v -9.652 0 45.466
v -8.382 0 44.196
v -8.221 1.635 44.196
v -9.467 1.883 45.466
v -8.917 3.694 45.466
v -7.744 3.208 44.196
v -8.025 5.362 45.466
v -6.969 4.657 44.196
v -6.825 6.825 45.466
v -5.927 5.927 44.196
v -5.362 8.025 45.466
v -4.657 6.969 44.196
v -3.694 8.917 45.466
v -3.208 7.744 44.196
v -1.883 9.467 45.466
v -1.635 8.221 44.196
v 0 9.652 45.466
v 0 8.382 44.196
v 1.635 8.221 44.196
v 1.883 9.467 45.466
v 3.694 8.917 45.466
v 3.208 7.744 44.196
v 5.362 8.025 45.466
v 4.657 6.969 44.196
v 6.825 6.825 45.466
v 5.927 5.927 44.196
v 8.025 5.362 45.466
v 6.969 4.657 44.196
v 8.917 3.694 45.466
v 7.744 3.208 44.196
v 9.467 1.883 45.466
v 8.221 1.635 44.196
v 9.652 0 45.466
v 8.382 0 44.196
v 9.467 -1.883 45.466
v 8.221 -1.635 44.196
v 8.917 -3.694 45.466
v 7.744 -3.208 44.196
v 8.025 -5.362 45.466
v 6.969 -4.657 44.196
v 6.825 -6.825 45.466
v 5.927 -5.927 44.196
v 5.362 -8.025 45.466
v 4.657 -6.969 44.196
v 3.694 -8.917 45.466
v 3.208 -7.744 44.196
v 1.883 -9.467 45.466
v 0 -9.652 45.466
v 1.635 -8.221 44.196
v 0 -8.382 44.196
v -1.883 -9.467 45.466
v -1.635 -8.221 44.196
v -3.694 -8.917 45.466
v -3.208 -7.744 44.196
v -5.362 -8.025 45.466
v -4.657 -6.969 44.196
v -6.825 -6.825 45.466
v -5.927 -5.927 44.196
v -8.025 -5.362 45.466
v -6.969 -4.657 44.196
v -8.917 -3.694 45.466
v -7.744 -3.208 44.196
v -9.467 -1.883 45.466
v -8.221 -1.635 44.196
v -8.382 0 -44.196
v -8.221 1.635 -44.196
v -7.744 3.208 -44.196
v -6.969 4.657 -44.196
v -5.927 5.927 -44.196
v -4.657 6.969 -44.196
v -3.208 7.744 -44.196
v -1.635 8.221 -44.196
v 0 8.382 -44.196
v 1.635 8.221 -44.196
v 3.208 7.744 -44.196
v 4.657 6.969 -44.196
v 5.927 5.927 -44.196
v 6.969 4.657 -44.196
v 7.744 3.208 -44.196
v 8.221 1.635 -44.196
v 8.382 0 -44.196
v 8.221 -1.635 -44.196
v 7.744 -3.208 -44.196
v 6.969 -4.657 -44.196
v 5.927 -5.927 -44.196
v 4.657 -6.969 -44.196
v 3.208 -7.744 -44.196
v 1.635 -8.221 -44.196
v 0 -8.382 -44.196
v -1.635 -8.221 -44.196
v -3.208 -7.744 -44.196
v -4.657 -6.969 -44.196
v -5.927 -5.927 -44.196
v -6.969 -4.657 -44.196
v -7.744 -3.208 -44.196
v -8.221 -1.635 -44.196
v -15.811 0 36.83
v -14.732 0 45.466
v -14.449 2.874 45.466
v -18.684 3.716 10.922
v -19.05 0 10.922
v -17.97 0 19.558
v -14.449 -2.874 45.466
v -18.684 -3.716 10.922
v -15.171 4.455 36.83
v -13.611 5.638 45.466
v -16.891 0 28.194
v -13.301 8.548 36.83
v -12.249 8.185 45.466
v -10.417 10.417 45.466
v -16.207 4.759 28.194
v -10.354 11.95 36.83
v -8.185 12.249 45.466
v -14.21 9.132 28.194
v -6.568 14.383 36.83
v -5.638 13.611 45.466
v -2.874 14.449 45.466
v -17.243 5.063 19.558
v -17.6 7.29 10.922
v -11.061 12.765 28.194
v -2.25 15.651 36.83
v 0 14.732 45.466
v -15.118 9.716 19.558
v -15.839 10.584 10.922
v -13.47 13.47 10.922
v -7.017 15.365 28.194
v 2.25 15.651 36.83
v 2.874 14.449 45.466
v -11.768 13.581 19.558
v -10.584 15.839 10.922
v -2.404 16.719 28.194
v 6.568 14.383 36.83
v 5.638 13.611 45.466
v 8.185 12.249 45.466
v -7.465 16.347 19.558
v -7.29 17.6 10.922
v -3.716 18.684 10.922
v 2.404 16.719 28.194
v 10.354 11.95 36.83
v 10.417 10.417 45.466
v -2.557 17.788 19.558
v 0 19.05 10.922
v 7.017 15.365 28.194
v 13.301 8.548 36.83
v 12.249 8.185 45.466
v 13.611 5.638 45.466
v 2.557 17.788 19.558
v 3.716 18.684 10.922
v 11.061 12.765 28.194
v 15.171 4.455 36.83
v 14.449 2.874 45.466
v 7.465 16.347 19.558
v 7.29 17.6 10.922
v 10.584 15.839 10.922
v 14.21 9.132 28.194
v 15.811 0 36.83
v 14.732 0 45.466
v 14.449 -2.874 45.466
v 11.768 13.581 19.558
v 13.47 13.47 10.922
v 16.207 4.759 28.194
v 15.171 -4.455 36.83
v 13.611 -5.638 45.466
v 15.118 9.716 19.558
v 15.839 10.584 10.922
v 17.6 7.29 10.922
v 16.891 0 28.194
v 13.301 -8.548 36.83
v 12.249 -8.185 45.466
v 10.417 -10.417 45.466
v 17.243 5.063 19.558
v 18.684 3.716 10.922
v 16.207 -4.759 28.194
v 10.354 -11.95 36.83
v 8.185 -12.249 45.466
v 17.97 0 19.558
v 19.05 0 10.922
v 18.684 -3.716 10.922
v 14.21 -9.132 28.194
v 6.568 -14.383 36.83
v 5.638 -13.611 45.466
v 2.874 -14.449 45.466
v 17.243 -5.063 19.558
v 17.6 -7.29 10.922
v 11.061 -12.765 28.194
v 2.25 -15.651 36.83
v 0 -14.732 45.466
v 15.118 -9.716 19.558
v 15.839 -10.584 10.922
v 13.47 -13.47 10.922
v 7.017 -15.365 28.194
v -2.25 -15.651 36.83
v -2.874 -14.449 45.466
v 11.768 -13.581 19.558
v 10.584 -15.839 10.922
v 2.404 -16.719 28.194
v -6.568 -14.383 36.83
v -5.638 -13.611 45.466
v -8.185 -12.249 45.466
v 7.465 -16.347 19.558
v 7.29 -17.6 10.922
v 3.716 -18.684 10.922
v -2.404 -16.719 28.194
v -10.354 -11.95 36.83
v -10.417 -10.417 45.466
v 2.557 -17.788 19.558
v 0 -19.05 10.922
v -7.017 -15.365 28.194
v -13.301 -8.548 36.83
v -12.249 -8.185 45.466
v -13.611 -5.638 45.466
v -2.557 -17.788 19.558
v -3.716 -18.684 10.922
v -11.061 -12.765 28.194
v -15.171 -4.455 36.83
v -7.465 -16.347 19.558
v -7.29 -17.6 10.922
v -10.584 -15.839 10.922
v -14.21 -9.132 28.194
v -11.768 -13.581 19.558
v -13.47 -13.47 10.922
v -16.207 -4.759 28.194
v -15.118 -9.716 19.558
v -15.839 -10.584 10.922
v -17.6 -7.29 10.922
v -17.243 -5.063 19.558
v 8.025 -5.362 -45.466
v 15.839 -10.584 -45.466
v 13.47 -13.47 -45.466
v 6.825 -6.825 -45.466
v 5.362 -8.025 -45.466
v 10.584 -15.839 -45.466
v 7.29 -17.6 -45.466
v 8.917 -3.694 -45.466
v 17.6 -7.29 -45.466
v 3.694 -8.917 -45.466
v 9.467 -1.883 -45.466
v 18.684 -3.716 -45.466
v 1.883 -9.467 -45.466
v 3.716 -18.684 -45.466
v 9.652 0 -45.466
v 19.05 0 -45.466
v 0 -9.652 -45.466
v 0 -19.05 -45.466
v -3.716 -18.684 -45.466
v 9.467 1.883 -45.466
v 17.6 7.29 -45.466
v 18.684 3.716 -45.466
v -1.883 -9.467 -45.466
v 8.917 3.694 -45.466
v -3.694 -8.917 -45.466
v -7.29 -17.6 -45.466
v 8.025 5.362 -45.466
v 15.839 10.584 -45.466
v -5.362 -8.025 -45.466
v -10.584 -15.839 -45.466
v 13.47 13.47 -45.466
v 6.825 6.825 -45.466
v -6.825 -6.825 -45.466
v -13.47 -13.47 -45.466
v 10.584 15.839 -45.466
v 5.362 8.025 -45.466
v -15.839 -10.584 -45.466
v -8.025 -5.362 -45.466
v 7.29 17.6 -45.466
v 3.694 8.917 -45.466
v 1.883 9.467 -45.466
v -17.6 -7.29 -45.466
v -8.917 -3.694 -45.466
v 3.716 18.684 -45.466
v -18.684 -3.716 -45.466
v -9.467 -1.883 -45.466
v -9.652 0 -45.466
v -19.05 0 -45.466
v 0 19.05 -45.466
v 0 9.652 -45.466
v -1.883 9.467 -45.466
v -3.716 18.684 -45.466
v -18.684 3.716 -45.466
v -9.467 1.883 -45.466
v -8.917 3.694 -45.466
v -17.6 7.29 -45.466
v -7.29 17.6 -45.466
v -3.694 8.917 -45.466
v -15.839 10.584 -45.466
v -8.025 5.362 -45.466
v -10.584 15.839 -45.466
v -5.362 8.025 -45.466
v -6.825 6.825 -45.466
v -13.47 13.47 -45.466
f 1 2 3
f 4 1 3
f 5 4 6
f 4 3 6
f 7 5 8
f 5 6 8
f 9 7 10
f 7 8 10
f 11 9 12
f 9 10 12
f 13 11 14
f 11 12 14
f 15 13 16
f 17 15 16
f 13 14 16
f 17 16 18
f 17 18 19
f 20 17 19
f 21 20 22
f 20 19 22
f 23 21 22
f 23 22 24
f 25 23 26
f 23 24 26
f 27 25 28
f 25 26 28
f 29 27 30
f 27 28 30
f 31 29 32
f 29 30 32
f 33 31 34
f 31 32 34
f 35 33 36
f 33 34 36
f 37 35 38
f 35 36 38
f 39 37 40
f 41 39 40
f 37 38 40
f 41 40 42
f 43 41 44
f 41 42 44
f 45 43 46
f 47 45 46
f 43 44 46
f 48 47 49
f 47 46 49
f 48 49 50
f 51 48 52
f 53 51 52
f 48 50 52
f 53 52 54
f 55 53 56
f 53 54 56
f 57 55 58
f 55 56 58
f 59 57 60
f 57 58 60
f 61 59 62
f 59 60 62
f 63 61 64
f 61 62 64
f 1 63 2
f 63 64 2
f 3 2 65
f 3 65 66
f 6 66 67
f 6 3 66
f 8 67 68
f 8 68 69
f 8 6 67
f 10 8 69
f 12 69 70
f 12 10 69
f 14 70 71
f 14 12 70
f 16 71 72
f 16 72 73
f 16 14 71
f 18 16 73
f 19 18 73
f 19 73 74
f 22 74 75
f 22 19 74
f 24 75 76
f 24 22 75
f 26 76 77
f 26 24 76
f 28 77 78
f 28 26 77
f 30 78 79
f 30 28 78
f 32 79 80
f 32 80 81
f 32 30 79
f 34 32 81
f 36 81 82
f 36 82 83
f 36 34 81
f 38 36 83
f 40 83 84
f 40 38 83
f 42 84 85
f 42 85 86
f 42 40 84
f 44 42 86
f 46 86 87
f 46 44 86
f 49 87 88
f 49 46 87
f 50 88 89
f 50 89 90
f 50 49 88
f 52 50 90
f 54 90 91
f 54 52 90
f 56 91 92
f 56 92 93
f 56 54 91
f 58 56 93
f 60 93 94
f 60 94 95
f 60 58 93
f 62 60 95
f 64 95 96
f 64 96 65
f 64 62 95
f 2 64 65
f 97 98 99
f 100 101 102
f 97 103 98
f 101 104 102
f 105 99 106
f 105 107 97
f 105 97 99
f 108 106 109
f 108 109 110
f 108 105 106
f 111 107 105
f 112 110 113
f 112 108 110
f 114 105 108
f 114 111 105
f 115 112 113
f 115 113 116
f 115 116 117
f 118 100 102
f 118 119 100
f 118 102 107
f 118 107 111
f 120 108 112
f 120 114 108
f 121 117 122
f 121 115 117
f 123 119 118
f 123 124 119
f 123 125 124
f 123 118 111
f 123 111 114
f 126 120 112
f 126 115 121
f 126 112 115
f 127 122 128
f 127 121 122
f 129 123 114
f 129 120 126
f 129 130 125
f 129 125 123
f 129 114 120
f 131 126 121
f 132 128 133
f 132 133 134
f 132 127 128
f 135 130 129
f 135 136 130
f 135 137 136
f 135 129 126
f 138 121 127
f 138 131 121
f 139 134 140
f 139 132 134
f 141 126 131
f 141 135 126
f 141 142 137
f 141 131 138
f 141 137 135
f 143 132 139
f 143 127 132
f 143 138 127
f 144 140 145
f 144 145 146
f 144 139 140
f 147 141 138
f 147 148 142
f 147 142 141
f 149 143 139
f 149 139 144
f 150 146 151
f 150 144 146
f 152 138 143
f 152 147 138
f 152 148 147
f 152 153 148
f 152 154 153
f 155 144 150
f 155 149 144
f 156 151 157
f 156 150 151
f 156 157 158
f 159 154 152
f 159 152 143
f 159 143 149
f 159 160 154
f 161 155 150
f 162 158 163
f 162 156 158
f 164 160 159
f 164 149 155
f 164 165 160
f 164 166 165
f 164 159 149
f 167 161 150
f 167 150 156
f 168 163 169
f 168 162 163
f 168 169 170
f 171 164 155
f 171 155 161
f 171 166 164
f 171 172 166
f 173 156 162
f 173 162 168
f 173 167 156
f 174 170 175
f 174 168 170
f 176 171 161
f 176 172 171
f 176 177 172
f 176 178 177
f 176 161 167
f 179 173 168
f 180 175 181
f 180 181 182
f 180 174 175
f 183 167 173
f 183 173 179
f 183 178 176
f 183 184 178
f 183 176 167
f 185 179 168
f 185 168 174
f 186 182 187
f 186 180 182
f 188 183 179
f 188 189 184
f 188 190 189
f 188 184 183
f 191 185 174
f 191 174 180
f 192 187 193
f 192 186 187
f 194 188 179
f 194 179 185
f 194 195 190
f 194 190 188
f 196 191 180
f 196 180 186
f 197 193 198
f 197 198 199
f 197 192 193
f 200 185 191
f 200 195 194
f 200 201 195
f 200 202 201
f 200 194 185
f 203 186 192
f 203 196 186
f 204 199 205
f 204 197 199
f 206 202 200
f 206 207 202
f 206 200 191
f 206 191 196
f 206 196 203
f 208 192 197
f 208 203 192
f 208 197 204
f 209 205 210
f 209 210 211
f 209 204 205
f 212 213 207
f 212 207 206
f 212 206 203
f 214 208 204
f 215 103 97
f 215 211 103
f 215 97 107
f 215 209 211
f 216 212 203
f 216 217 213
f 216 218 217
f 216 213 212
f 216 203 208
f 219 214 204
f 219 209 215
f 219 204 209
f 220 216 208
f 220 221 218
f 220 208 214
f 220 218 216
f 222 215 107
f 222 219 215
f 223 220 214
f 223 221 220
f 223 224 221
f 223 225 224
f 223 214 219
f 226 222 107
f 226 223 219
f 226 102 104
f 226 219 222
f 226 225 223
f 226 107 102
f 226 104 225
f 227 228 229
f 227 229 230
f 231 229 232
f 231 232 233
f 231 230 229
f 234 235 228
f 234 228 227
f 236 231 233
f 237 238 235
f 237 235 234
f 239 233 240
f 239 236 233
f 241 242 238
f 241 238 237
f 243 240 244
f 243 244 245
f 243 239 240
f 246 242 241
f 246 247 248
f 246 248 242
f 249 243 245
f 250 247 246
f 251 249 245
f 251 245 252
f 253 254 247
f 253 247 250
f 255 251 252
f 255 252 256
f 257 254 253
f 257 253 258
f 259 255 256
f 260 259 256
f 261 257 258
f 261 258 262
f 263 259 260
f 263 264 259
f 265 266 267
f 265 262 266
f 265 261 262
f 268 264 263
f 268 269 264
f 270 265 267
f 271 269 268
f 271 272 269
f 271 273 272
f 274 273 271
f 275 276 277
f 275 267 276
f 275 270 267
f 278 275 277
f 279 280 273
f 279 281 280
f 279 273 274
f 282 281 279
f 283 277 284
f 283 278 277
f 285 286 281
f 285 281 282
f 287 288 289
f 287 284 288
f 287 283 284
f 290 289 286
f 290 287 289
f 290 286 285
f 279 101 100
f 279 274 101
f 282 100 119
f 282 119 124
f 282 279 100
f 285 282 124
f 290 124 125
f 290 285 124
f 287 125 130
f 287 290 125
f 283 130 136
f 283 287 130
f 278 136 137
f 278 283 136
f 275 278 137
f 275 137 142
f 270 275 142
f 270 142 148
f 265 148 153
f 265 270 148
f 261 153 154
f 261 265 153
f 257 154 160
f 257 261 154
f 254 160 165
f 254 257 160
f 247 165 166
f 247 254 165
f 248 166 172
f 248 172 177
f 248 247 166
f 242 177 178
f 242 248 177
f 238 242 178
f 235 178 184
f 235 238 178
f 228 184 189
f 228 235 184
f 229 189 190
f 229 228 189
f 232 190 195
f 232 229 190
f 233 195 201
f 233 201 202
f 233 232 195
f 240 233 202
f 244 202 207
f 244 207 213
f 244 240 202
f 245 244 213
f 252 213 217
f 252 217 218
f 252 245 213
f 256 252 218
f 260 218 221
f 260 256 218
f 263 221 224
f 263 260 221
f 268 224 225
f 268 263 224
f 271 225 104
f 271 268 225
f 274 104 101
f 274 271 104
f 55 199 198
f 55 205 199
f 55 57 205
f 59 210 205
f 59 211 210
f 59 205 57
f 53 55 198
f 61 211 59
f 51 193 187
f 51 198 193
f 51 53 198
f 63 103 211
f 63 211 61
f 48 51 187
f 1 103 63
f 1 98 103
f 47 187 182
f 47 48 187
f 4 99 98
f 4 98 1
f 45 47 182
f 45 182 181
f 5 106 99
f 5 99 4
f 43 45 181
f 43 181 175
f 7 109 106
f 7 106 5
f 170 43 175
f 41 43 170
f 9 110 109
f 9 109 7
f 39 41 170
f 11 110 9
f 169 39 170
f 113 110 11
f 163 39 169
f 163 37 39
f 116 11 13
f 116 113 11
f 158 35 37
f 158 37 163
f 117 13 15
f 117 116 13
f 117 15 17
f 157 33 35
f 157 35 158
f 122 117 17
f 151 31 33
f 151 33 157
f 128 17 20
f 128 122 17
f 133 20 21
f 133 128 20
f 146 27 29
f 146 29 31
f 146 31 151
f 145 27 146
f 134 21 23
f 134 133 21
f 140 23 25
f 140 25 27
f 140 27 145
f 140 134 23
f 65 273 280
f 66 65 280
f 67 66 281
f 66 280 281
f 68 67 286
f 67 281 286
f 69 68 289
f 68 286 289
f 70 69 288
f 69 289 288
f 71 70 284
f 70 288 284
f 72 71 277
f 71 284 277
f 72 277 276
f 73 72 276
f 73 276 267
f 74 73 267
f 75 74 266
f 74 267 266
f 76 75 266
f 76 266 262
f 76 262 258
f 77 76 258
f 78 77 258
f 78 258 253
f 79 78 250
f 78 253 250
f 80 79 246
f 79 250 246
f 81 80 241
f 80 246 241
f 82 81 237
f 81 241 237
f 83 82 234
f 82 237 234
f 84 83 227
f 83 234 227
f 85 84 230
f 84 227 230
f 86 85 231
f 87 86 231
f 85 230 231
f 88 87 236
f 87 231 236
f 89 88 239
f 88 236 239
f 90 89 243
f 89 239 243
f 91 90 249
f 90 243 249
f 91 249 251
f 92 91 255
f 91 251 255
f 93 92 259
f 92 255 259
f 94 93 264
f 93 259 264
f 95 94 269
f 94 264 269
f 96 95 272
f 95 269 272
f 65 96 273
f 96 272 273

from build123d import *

# Parameters (mm, degrees)
F3_SIZE = 1.27
F4_SIZE = 1.27


with BuildPart() as f2:
    # F0 (on Front) → F2 (revolve)
    with BuildSketch(Plane.XZ):
        Polygon((-8.382, 0), (-8.382, 45.466), (-14.732, 45.466), (-19.05, 10.922), (-19.05, -45.466), (-8.382, -45.466), align=None)
    revolve(axis=Axis((0, 0, 0.149863), (0, 0, -1)))

    # F3
    f3_edges = [f2.edges().sort_by_distance(p)[0] for p in [
        (8.382, 0, 45.466),
    ]]
    chamfer(f3_edges, length=F3_SIZE)

    # F4
    f4_edges = [f2.edges().sort_by_distance(p)[0] for p in [
        (8.382, 0, -45.466),
    ]]
    chamfer(f4_edges, length=F4_SIZE)


solid = f2.part
